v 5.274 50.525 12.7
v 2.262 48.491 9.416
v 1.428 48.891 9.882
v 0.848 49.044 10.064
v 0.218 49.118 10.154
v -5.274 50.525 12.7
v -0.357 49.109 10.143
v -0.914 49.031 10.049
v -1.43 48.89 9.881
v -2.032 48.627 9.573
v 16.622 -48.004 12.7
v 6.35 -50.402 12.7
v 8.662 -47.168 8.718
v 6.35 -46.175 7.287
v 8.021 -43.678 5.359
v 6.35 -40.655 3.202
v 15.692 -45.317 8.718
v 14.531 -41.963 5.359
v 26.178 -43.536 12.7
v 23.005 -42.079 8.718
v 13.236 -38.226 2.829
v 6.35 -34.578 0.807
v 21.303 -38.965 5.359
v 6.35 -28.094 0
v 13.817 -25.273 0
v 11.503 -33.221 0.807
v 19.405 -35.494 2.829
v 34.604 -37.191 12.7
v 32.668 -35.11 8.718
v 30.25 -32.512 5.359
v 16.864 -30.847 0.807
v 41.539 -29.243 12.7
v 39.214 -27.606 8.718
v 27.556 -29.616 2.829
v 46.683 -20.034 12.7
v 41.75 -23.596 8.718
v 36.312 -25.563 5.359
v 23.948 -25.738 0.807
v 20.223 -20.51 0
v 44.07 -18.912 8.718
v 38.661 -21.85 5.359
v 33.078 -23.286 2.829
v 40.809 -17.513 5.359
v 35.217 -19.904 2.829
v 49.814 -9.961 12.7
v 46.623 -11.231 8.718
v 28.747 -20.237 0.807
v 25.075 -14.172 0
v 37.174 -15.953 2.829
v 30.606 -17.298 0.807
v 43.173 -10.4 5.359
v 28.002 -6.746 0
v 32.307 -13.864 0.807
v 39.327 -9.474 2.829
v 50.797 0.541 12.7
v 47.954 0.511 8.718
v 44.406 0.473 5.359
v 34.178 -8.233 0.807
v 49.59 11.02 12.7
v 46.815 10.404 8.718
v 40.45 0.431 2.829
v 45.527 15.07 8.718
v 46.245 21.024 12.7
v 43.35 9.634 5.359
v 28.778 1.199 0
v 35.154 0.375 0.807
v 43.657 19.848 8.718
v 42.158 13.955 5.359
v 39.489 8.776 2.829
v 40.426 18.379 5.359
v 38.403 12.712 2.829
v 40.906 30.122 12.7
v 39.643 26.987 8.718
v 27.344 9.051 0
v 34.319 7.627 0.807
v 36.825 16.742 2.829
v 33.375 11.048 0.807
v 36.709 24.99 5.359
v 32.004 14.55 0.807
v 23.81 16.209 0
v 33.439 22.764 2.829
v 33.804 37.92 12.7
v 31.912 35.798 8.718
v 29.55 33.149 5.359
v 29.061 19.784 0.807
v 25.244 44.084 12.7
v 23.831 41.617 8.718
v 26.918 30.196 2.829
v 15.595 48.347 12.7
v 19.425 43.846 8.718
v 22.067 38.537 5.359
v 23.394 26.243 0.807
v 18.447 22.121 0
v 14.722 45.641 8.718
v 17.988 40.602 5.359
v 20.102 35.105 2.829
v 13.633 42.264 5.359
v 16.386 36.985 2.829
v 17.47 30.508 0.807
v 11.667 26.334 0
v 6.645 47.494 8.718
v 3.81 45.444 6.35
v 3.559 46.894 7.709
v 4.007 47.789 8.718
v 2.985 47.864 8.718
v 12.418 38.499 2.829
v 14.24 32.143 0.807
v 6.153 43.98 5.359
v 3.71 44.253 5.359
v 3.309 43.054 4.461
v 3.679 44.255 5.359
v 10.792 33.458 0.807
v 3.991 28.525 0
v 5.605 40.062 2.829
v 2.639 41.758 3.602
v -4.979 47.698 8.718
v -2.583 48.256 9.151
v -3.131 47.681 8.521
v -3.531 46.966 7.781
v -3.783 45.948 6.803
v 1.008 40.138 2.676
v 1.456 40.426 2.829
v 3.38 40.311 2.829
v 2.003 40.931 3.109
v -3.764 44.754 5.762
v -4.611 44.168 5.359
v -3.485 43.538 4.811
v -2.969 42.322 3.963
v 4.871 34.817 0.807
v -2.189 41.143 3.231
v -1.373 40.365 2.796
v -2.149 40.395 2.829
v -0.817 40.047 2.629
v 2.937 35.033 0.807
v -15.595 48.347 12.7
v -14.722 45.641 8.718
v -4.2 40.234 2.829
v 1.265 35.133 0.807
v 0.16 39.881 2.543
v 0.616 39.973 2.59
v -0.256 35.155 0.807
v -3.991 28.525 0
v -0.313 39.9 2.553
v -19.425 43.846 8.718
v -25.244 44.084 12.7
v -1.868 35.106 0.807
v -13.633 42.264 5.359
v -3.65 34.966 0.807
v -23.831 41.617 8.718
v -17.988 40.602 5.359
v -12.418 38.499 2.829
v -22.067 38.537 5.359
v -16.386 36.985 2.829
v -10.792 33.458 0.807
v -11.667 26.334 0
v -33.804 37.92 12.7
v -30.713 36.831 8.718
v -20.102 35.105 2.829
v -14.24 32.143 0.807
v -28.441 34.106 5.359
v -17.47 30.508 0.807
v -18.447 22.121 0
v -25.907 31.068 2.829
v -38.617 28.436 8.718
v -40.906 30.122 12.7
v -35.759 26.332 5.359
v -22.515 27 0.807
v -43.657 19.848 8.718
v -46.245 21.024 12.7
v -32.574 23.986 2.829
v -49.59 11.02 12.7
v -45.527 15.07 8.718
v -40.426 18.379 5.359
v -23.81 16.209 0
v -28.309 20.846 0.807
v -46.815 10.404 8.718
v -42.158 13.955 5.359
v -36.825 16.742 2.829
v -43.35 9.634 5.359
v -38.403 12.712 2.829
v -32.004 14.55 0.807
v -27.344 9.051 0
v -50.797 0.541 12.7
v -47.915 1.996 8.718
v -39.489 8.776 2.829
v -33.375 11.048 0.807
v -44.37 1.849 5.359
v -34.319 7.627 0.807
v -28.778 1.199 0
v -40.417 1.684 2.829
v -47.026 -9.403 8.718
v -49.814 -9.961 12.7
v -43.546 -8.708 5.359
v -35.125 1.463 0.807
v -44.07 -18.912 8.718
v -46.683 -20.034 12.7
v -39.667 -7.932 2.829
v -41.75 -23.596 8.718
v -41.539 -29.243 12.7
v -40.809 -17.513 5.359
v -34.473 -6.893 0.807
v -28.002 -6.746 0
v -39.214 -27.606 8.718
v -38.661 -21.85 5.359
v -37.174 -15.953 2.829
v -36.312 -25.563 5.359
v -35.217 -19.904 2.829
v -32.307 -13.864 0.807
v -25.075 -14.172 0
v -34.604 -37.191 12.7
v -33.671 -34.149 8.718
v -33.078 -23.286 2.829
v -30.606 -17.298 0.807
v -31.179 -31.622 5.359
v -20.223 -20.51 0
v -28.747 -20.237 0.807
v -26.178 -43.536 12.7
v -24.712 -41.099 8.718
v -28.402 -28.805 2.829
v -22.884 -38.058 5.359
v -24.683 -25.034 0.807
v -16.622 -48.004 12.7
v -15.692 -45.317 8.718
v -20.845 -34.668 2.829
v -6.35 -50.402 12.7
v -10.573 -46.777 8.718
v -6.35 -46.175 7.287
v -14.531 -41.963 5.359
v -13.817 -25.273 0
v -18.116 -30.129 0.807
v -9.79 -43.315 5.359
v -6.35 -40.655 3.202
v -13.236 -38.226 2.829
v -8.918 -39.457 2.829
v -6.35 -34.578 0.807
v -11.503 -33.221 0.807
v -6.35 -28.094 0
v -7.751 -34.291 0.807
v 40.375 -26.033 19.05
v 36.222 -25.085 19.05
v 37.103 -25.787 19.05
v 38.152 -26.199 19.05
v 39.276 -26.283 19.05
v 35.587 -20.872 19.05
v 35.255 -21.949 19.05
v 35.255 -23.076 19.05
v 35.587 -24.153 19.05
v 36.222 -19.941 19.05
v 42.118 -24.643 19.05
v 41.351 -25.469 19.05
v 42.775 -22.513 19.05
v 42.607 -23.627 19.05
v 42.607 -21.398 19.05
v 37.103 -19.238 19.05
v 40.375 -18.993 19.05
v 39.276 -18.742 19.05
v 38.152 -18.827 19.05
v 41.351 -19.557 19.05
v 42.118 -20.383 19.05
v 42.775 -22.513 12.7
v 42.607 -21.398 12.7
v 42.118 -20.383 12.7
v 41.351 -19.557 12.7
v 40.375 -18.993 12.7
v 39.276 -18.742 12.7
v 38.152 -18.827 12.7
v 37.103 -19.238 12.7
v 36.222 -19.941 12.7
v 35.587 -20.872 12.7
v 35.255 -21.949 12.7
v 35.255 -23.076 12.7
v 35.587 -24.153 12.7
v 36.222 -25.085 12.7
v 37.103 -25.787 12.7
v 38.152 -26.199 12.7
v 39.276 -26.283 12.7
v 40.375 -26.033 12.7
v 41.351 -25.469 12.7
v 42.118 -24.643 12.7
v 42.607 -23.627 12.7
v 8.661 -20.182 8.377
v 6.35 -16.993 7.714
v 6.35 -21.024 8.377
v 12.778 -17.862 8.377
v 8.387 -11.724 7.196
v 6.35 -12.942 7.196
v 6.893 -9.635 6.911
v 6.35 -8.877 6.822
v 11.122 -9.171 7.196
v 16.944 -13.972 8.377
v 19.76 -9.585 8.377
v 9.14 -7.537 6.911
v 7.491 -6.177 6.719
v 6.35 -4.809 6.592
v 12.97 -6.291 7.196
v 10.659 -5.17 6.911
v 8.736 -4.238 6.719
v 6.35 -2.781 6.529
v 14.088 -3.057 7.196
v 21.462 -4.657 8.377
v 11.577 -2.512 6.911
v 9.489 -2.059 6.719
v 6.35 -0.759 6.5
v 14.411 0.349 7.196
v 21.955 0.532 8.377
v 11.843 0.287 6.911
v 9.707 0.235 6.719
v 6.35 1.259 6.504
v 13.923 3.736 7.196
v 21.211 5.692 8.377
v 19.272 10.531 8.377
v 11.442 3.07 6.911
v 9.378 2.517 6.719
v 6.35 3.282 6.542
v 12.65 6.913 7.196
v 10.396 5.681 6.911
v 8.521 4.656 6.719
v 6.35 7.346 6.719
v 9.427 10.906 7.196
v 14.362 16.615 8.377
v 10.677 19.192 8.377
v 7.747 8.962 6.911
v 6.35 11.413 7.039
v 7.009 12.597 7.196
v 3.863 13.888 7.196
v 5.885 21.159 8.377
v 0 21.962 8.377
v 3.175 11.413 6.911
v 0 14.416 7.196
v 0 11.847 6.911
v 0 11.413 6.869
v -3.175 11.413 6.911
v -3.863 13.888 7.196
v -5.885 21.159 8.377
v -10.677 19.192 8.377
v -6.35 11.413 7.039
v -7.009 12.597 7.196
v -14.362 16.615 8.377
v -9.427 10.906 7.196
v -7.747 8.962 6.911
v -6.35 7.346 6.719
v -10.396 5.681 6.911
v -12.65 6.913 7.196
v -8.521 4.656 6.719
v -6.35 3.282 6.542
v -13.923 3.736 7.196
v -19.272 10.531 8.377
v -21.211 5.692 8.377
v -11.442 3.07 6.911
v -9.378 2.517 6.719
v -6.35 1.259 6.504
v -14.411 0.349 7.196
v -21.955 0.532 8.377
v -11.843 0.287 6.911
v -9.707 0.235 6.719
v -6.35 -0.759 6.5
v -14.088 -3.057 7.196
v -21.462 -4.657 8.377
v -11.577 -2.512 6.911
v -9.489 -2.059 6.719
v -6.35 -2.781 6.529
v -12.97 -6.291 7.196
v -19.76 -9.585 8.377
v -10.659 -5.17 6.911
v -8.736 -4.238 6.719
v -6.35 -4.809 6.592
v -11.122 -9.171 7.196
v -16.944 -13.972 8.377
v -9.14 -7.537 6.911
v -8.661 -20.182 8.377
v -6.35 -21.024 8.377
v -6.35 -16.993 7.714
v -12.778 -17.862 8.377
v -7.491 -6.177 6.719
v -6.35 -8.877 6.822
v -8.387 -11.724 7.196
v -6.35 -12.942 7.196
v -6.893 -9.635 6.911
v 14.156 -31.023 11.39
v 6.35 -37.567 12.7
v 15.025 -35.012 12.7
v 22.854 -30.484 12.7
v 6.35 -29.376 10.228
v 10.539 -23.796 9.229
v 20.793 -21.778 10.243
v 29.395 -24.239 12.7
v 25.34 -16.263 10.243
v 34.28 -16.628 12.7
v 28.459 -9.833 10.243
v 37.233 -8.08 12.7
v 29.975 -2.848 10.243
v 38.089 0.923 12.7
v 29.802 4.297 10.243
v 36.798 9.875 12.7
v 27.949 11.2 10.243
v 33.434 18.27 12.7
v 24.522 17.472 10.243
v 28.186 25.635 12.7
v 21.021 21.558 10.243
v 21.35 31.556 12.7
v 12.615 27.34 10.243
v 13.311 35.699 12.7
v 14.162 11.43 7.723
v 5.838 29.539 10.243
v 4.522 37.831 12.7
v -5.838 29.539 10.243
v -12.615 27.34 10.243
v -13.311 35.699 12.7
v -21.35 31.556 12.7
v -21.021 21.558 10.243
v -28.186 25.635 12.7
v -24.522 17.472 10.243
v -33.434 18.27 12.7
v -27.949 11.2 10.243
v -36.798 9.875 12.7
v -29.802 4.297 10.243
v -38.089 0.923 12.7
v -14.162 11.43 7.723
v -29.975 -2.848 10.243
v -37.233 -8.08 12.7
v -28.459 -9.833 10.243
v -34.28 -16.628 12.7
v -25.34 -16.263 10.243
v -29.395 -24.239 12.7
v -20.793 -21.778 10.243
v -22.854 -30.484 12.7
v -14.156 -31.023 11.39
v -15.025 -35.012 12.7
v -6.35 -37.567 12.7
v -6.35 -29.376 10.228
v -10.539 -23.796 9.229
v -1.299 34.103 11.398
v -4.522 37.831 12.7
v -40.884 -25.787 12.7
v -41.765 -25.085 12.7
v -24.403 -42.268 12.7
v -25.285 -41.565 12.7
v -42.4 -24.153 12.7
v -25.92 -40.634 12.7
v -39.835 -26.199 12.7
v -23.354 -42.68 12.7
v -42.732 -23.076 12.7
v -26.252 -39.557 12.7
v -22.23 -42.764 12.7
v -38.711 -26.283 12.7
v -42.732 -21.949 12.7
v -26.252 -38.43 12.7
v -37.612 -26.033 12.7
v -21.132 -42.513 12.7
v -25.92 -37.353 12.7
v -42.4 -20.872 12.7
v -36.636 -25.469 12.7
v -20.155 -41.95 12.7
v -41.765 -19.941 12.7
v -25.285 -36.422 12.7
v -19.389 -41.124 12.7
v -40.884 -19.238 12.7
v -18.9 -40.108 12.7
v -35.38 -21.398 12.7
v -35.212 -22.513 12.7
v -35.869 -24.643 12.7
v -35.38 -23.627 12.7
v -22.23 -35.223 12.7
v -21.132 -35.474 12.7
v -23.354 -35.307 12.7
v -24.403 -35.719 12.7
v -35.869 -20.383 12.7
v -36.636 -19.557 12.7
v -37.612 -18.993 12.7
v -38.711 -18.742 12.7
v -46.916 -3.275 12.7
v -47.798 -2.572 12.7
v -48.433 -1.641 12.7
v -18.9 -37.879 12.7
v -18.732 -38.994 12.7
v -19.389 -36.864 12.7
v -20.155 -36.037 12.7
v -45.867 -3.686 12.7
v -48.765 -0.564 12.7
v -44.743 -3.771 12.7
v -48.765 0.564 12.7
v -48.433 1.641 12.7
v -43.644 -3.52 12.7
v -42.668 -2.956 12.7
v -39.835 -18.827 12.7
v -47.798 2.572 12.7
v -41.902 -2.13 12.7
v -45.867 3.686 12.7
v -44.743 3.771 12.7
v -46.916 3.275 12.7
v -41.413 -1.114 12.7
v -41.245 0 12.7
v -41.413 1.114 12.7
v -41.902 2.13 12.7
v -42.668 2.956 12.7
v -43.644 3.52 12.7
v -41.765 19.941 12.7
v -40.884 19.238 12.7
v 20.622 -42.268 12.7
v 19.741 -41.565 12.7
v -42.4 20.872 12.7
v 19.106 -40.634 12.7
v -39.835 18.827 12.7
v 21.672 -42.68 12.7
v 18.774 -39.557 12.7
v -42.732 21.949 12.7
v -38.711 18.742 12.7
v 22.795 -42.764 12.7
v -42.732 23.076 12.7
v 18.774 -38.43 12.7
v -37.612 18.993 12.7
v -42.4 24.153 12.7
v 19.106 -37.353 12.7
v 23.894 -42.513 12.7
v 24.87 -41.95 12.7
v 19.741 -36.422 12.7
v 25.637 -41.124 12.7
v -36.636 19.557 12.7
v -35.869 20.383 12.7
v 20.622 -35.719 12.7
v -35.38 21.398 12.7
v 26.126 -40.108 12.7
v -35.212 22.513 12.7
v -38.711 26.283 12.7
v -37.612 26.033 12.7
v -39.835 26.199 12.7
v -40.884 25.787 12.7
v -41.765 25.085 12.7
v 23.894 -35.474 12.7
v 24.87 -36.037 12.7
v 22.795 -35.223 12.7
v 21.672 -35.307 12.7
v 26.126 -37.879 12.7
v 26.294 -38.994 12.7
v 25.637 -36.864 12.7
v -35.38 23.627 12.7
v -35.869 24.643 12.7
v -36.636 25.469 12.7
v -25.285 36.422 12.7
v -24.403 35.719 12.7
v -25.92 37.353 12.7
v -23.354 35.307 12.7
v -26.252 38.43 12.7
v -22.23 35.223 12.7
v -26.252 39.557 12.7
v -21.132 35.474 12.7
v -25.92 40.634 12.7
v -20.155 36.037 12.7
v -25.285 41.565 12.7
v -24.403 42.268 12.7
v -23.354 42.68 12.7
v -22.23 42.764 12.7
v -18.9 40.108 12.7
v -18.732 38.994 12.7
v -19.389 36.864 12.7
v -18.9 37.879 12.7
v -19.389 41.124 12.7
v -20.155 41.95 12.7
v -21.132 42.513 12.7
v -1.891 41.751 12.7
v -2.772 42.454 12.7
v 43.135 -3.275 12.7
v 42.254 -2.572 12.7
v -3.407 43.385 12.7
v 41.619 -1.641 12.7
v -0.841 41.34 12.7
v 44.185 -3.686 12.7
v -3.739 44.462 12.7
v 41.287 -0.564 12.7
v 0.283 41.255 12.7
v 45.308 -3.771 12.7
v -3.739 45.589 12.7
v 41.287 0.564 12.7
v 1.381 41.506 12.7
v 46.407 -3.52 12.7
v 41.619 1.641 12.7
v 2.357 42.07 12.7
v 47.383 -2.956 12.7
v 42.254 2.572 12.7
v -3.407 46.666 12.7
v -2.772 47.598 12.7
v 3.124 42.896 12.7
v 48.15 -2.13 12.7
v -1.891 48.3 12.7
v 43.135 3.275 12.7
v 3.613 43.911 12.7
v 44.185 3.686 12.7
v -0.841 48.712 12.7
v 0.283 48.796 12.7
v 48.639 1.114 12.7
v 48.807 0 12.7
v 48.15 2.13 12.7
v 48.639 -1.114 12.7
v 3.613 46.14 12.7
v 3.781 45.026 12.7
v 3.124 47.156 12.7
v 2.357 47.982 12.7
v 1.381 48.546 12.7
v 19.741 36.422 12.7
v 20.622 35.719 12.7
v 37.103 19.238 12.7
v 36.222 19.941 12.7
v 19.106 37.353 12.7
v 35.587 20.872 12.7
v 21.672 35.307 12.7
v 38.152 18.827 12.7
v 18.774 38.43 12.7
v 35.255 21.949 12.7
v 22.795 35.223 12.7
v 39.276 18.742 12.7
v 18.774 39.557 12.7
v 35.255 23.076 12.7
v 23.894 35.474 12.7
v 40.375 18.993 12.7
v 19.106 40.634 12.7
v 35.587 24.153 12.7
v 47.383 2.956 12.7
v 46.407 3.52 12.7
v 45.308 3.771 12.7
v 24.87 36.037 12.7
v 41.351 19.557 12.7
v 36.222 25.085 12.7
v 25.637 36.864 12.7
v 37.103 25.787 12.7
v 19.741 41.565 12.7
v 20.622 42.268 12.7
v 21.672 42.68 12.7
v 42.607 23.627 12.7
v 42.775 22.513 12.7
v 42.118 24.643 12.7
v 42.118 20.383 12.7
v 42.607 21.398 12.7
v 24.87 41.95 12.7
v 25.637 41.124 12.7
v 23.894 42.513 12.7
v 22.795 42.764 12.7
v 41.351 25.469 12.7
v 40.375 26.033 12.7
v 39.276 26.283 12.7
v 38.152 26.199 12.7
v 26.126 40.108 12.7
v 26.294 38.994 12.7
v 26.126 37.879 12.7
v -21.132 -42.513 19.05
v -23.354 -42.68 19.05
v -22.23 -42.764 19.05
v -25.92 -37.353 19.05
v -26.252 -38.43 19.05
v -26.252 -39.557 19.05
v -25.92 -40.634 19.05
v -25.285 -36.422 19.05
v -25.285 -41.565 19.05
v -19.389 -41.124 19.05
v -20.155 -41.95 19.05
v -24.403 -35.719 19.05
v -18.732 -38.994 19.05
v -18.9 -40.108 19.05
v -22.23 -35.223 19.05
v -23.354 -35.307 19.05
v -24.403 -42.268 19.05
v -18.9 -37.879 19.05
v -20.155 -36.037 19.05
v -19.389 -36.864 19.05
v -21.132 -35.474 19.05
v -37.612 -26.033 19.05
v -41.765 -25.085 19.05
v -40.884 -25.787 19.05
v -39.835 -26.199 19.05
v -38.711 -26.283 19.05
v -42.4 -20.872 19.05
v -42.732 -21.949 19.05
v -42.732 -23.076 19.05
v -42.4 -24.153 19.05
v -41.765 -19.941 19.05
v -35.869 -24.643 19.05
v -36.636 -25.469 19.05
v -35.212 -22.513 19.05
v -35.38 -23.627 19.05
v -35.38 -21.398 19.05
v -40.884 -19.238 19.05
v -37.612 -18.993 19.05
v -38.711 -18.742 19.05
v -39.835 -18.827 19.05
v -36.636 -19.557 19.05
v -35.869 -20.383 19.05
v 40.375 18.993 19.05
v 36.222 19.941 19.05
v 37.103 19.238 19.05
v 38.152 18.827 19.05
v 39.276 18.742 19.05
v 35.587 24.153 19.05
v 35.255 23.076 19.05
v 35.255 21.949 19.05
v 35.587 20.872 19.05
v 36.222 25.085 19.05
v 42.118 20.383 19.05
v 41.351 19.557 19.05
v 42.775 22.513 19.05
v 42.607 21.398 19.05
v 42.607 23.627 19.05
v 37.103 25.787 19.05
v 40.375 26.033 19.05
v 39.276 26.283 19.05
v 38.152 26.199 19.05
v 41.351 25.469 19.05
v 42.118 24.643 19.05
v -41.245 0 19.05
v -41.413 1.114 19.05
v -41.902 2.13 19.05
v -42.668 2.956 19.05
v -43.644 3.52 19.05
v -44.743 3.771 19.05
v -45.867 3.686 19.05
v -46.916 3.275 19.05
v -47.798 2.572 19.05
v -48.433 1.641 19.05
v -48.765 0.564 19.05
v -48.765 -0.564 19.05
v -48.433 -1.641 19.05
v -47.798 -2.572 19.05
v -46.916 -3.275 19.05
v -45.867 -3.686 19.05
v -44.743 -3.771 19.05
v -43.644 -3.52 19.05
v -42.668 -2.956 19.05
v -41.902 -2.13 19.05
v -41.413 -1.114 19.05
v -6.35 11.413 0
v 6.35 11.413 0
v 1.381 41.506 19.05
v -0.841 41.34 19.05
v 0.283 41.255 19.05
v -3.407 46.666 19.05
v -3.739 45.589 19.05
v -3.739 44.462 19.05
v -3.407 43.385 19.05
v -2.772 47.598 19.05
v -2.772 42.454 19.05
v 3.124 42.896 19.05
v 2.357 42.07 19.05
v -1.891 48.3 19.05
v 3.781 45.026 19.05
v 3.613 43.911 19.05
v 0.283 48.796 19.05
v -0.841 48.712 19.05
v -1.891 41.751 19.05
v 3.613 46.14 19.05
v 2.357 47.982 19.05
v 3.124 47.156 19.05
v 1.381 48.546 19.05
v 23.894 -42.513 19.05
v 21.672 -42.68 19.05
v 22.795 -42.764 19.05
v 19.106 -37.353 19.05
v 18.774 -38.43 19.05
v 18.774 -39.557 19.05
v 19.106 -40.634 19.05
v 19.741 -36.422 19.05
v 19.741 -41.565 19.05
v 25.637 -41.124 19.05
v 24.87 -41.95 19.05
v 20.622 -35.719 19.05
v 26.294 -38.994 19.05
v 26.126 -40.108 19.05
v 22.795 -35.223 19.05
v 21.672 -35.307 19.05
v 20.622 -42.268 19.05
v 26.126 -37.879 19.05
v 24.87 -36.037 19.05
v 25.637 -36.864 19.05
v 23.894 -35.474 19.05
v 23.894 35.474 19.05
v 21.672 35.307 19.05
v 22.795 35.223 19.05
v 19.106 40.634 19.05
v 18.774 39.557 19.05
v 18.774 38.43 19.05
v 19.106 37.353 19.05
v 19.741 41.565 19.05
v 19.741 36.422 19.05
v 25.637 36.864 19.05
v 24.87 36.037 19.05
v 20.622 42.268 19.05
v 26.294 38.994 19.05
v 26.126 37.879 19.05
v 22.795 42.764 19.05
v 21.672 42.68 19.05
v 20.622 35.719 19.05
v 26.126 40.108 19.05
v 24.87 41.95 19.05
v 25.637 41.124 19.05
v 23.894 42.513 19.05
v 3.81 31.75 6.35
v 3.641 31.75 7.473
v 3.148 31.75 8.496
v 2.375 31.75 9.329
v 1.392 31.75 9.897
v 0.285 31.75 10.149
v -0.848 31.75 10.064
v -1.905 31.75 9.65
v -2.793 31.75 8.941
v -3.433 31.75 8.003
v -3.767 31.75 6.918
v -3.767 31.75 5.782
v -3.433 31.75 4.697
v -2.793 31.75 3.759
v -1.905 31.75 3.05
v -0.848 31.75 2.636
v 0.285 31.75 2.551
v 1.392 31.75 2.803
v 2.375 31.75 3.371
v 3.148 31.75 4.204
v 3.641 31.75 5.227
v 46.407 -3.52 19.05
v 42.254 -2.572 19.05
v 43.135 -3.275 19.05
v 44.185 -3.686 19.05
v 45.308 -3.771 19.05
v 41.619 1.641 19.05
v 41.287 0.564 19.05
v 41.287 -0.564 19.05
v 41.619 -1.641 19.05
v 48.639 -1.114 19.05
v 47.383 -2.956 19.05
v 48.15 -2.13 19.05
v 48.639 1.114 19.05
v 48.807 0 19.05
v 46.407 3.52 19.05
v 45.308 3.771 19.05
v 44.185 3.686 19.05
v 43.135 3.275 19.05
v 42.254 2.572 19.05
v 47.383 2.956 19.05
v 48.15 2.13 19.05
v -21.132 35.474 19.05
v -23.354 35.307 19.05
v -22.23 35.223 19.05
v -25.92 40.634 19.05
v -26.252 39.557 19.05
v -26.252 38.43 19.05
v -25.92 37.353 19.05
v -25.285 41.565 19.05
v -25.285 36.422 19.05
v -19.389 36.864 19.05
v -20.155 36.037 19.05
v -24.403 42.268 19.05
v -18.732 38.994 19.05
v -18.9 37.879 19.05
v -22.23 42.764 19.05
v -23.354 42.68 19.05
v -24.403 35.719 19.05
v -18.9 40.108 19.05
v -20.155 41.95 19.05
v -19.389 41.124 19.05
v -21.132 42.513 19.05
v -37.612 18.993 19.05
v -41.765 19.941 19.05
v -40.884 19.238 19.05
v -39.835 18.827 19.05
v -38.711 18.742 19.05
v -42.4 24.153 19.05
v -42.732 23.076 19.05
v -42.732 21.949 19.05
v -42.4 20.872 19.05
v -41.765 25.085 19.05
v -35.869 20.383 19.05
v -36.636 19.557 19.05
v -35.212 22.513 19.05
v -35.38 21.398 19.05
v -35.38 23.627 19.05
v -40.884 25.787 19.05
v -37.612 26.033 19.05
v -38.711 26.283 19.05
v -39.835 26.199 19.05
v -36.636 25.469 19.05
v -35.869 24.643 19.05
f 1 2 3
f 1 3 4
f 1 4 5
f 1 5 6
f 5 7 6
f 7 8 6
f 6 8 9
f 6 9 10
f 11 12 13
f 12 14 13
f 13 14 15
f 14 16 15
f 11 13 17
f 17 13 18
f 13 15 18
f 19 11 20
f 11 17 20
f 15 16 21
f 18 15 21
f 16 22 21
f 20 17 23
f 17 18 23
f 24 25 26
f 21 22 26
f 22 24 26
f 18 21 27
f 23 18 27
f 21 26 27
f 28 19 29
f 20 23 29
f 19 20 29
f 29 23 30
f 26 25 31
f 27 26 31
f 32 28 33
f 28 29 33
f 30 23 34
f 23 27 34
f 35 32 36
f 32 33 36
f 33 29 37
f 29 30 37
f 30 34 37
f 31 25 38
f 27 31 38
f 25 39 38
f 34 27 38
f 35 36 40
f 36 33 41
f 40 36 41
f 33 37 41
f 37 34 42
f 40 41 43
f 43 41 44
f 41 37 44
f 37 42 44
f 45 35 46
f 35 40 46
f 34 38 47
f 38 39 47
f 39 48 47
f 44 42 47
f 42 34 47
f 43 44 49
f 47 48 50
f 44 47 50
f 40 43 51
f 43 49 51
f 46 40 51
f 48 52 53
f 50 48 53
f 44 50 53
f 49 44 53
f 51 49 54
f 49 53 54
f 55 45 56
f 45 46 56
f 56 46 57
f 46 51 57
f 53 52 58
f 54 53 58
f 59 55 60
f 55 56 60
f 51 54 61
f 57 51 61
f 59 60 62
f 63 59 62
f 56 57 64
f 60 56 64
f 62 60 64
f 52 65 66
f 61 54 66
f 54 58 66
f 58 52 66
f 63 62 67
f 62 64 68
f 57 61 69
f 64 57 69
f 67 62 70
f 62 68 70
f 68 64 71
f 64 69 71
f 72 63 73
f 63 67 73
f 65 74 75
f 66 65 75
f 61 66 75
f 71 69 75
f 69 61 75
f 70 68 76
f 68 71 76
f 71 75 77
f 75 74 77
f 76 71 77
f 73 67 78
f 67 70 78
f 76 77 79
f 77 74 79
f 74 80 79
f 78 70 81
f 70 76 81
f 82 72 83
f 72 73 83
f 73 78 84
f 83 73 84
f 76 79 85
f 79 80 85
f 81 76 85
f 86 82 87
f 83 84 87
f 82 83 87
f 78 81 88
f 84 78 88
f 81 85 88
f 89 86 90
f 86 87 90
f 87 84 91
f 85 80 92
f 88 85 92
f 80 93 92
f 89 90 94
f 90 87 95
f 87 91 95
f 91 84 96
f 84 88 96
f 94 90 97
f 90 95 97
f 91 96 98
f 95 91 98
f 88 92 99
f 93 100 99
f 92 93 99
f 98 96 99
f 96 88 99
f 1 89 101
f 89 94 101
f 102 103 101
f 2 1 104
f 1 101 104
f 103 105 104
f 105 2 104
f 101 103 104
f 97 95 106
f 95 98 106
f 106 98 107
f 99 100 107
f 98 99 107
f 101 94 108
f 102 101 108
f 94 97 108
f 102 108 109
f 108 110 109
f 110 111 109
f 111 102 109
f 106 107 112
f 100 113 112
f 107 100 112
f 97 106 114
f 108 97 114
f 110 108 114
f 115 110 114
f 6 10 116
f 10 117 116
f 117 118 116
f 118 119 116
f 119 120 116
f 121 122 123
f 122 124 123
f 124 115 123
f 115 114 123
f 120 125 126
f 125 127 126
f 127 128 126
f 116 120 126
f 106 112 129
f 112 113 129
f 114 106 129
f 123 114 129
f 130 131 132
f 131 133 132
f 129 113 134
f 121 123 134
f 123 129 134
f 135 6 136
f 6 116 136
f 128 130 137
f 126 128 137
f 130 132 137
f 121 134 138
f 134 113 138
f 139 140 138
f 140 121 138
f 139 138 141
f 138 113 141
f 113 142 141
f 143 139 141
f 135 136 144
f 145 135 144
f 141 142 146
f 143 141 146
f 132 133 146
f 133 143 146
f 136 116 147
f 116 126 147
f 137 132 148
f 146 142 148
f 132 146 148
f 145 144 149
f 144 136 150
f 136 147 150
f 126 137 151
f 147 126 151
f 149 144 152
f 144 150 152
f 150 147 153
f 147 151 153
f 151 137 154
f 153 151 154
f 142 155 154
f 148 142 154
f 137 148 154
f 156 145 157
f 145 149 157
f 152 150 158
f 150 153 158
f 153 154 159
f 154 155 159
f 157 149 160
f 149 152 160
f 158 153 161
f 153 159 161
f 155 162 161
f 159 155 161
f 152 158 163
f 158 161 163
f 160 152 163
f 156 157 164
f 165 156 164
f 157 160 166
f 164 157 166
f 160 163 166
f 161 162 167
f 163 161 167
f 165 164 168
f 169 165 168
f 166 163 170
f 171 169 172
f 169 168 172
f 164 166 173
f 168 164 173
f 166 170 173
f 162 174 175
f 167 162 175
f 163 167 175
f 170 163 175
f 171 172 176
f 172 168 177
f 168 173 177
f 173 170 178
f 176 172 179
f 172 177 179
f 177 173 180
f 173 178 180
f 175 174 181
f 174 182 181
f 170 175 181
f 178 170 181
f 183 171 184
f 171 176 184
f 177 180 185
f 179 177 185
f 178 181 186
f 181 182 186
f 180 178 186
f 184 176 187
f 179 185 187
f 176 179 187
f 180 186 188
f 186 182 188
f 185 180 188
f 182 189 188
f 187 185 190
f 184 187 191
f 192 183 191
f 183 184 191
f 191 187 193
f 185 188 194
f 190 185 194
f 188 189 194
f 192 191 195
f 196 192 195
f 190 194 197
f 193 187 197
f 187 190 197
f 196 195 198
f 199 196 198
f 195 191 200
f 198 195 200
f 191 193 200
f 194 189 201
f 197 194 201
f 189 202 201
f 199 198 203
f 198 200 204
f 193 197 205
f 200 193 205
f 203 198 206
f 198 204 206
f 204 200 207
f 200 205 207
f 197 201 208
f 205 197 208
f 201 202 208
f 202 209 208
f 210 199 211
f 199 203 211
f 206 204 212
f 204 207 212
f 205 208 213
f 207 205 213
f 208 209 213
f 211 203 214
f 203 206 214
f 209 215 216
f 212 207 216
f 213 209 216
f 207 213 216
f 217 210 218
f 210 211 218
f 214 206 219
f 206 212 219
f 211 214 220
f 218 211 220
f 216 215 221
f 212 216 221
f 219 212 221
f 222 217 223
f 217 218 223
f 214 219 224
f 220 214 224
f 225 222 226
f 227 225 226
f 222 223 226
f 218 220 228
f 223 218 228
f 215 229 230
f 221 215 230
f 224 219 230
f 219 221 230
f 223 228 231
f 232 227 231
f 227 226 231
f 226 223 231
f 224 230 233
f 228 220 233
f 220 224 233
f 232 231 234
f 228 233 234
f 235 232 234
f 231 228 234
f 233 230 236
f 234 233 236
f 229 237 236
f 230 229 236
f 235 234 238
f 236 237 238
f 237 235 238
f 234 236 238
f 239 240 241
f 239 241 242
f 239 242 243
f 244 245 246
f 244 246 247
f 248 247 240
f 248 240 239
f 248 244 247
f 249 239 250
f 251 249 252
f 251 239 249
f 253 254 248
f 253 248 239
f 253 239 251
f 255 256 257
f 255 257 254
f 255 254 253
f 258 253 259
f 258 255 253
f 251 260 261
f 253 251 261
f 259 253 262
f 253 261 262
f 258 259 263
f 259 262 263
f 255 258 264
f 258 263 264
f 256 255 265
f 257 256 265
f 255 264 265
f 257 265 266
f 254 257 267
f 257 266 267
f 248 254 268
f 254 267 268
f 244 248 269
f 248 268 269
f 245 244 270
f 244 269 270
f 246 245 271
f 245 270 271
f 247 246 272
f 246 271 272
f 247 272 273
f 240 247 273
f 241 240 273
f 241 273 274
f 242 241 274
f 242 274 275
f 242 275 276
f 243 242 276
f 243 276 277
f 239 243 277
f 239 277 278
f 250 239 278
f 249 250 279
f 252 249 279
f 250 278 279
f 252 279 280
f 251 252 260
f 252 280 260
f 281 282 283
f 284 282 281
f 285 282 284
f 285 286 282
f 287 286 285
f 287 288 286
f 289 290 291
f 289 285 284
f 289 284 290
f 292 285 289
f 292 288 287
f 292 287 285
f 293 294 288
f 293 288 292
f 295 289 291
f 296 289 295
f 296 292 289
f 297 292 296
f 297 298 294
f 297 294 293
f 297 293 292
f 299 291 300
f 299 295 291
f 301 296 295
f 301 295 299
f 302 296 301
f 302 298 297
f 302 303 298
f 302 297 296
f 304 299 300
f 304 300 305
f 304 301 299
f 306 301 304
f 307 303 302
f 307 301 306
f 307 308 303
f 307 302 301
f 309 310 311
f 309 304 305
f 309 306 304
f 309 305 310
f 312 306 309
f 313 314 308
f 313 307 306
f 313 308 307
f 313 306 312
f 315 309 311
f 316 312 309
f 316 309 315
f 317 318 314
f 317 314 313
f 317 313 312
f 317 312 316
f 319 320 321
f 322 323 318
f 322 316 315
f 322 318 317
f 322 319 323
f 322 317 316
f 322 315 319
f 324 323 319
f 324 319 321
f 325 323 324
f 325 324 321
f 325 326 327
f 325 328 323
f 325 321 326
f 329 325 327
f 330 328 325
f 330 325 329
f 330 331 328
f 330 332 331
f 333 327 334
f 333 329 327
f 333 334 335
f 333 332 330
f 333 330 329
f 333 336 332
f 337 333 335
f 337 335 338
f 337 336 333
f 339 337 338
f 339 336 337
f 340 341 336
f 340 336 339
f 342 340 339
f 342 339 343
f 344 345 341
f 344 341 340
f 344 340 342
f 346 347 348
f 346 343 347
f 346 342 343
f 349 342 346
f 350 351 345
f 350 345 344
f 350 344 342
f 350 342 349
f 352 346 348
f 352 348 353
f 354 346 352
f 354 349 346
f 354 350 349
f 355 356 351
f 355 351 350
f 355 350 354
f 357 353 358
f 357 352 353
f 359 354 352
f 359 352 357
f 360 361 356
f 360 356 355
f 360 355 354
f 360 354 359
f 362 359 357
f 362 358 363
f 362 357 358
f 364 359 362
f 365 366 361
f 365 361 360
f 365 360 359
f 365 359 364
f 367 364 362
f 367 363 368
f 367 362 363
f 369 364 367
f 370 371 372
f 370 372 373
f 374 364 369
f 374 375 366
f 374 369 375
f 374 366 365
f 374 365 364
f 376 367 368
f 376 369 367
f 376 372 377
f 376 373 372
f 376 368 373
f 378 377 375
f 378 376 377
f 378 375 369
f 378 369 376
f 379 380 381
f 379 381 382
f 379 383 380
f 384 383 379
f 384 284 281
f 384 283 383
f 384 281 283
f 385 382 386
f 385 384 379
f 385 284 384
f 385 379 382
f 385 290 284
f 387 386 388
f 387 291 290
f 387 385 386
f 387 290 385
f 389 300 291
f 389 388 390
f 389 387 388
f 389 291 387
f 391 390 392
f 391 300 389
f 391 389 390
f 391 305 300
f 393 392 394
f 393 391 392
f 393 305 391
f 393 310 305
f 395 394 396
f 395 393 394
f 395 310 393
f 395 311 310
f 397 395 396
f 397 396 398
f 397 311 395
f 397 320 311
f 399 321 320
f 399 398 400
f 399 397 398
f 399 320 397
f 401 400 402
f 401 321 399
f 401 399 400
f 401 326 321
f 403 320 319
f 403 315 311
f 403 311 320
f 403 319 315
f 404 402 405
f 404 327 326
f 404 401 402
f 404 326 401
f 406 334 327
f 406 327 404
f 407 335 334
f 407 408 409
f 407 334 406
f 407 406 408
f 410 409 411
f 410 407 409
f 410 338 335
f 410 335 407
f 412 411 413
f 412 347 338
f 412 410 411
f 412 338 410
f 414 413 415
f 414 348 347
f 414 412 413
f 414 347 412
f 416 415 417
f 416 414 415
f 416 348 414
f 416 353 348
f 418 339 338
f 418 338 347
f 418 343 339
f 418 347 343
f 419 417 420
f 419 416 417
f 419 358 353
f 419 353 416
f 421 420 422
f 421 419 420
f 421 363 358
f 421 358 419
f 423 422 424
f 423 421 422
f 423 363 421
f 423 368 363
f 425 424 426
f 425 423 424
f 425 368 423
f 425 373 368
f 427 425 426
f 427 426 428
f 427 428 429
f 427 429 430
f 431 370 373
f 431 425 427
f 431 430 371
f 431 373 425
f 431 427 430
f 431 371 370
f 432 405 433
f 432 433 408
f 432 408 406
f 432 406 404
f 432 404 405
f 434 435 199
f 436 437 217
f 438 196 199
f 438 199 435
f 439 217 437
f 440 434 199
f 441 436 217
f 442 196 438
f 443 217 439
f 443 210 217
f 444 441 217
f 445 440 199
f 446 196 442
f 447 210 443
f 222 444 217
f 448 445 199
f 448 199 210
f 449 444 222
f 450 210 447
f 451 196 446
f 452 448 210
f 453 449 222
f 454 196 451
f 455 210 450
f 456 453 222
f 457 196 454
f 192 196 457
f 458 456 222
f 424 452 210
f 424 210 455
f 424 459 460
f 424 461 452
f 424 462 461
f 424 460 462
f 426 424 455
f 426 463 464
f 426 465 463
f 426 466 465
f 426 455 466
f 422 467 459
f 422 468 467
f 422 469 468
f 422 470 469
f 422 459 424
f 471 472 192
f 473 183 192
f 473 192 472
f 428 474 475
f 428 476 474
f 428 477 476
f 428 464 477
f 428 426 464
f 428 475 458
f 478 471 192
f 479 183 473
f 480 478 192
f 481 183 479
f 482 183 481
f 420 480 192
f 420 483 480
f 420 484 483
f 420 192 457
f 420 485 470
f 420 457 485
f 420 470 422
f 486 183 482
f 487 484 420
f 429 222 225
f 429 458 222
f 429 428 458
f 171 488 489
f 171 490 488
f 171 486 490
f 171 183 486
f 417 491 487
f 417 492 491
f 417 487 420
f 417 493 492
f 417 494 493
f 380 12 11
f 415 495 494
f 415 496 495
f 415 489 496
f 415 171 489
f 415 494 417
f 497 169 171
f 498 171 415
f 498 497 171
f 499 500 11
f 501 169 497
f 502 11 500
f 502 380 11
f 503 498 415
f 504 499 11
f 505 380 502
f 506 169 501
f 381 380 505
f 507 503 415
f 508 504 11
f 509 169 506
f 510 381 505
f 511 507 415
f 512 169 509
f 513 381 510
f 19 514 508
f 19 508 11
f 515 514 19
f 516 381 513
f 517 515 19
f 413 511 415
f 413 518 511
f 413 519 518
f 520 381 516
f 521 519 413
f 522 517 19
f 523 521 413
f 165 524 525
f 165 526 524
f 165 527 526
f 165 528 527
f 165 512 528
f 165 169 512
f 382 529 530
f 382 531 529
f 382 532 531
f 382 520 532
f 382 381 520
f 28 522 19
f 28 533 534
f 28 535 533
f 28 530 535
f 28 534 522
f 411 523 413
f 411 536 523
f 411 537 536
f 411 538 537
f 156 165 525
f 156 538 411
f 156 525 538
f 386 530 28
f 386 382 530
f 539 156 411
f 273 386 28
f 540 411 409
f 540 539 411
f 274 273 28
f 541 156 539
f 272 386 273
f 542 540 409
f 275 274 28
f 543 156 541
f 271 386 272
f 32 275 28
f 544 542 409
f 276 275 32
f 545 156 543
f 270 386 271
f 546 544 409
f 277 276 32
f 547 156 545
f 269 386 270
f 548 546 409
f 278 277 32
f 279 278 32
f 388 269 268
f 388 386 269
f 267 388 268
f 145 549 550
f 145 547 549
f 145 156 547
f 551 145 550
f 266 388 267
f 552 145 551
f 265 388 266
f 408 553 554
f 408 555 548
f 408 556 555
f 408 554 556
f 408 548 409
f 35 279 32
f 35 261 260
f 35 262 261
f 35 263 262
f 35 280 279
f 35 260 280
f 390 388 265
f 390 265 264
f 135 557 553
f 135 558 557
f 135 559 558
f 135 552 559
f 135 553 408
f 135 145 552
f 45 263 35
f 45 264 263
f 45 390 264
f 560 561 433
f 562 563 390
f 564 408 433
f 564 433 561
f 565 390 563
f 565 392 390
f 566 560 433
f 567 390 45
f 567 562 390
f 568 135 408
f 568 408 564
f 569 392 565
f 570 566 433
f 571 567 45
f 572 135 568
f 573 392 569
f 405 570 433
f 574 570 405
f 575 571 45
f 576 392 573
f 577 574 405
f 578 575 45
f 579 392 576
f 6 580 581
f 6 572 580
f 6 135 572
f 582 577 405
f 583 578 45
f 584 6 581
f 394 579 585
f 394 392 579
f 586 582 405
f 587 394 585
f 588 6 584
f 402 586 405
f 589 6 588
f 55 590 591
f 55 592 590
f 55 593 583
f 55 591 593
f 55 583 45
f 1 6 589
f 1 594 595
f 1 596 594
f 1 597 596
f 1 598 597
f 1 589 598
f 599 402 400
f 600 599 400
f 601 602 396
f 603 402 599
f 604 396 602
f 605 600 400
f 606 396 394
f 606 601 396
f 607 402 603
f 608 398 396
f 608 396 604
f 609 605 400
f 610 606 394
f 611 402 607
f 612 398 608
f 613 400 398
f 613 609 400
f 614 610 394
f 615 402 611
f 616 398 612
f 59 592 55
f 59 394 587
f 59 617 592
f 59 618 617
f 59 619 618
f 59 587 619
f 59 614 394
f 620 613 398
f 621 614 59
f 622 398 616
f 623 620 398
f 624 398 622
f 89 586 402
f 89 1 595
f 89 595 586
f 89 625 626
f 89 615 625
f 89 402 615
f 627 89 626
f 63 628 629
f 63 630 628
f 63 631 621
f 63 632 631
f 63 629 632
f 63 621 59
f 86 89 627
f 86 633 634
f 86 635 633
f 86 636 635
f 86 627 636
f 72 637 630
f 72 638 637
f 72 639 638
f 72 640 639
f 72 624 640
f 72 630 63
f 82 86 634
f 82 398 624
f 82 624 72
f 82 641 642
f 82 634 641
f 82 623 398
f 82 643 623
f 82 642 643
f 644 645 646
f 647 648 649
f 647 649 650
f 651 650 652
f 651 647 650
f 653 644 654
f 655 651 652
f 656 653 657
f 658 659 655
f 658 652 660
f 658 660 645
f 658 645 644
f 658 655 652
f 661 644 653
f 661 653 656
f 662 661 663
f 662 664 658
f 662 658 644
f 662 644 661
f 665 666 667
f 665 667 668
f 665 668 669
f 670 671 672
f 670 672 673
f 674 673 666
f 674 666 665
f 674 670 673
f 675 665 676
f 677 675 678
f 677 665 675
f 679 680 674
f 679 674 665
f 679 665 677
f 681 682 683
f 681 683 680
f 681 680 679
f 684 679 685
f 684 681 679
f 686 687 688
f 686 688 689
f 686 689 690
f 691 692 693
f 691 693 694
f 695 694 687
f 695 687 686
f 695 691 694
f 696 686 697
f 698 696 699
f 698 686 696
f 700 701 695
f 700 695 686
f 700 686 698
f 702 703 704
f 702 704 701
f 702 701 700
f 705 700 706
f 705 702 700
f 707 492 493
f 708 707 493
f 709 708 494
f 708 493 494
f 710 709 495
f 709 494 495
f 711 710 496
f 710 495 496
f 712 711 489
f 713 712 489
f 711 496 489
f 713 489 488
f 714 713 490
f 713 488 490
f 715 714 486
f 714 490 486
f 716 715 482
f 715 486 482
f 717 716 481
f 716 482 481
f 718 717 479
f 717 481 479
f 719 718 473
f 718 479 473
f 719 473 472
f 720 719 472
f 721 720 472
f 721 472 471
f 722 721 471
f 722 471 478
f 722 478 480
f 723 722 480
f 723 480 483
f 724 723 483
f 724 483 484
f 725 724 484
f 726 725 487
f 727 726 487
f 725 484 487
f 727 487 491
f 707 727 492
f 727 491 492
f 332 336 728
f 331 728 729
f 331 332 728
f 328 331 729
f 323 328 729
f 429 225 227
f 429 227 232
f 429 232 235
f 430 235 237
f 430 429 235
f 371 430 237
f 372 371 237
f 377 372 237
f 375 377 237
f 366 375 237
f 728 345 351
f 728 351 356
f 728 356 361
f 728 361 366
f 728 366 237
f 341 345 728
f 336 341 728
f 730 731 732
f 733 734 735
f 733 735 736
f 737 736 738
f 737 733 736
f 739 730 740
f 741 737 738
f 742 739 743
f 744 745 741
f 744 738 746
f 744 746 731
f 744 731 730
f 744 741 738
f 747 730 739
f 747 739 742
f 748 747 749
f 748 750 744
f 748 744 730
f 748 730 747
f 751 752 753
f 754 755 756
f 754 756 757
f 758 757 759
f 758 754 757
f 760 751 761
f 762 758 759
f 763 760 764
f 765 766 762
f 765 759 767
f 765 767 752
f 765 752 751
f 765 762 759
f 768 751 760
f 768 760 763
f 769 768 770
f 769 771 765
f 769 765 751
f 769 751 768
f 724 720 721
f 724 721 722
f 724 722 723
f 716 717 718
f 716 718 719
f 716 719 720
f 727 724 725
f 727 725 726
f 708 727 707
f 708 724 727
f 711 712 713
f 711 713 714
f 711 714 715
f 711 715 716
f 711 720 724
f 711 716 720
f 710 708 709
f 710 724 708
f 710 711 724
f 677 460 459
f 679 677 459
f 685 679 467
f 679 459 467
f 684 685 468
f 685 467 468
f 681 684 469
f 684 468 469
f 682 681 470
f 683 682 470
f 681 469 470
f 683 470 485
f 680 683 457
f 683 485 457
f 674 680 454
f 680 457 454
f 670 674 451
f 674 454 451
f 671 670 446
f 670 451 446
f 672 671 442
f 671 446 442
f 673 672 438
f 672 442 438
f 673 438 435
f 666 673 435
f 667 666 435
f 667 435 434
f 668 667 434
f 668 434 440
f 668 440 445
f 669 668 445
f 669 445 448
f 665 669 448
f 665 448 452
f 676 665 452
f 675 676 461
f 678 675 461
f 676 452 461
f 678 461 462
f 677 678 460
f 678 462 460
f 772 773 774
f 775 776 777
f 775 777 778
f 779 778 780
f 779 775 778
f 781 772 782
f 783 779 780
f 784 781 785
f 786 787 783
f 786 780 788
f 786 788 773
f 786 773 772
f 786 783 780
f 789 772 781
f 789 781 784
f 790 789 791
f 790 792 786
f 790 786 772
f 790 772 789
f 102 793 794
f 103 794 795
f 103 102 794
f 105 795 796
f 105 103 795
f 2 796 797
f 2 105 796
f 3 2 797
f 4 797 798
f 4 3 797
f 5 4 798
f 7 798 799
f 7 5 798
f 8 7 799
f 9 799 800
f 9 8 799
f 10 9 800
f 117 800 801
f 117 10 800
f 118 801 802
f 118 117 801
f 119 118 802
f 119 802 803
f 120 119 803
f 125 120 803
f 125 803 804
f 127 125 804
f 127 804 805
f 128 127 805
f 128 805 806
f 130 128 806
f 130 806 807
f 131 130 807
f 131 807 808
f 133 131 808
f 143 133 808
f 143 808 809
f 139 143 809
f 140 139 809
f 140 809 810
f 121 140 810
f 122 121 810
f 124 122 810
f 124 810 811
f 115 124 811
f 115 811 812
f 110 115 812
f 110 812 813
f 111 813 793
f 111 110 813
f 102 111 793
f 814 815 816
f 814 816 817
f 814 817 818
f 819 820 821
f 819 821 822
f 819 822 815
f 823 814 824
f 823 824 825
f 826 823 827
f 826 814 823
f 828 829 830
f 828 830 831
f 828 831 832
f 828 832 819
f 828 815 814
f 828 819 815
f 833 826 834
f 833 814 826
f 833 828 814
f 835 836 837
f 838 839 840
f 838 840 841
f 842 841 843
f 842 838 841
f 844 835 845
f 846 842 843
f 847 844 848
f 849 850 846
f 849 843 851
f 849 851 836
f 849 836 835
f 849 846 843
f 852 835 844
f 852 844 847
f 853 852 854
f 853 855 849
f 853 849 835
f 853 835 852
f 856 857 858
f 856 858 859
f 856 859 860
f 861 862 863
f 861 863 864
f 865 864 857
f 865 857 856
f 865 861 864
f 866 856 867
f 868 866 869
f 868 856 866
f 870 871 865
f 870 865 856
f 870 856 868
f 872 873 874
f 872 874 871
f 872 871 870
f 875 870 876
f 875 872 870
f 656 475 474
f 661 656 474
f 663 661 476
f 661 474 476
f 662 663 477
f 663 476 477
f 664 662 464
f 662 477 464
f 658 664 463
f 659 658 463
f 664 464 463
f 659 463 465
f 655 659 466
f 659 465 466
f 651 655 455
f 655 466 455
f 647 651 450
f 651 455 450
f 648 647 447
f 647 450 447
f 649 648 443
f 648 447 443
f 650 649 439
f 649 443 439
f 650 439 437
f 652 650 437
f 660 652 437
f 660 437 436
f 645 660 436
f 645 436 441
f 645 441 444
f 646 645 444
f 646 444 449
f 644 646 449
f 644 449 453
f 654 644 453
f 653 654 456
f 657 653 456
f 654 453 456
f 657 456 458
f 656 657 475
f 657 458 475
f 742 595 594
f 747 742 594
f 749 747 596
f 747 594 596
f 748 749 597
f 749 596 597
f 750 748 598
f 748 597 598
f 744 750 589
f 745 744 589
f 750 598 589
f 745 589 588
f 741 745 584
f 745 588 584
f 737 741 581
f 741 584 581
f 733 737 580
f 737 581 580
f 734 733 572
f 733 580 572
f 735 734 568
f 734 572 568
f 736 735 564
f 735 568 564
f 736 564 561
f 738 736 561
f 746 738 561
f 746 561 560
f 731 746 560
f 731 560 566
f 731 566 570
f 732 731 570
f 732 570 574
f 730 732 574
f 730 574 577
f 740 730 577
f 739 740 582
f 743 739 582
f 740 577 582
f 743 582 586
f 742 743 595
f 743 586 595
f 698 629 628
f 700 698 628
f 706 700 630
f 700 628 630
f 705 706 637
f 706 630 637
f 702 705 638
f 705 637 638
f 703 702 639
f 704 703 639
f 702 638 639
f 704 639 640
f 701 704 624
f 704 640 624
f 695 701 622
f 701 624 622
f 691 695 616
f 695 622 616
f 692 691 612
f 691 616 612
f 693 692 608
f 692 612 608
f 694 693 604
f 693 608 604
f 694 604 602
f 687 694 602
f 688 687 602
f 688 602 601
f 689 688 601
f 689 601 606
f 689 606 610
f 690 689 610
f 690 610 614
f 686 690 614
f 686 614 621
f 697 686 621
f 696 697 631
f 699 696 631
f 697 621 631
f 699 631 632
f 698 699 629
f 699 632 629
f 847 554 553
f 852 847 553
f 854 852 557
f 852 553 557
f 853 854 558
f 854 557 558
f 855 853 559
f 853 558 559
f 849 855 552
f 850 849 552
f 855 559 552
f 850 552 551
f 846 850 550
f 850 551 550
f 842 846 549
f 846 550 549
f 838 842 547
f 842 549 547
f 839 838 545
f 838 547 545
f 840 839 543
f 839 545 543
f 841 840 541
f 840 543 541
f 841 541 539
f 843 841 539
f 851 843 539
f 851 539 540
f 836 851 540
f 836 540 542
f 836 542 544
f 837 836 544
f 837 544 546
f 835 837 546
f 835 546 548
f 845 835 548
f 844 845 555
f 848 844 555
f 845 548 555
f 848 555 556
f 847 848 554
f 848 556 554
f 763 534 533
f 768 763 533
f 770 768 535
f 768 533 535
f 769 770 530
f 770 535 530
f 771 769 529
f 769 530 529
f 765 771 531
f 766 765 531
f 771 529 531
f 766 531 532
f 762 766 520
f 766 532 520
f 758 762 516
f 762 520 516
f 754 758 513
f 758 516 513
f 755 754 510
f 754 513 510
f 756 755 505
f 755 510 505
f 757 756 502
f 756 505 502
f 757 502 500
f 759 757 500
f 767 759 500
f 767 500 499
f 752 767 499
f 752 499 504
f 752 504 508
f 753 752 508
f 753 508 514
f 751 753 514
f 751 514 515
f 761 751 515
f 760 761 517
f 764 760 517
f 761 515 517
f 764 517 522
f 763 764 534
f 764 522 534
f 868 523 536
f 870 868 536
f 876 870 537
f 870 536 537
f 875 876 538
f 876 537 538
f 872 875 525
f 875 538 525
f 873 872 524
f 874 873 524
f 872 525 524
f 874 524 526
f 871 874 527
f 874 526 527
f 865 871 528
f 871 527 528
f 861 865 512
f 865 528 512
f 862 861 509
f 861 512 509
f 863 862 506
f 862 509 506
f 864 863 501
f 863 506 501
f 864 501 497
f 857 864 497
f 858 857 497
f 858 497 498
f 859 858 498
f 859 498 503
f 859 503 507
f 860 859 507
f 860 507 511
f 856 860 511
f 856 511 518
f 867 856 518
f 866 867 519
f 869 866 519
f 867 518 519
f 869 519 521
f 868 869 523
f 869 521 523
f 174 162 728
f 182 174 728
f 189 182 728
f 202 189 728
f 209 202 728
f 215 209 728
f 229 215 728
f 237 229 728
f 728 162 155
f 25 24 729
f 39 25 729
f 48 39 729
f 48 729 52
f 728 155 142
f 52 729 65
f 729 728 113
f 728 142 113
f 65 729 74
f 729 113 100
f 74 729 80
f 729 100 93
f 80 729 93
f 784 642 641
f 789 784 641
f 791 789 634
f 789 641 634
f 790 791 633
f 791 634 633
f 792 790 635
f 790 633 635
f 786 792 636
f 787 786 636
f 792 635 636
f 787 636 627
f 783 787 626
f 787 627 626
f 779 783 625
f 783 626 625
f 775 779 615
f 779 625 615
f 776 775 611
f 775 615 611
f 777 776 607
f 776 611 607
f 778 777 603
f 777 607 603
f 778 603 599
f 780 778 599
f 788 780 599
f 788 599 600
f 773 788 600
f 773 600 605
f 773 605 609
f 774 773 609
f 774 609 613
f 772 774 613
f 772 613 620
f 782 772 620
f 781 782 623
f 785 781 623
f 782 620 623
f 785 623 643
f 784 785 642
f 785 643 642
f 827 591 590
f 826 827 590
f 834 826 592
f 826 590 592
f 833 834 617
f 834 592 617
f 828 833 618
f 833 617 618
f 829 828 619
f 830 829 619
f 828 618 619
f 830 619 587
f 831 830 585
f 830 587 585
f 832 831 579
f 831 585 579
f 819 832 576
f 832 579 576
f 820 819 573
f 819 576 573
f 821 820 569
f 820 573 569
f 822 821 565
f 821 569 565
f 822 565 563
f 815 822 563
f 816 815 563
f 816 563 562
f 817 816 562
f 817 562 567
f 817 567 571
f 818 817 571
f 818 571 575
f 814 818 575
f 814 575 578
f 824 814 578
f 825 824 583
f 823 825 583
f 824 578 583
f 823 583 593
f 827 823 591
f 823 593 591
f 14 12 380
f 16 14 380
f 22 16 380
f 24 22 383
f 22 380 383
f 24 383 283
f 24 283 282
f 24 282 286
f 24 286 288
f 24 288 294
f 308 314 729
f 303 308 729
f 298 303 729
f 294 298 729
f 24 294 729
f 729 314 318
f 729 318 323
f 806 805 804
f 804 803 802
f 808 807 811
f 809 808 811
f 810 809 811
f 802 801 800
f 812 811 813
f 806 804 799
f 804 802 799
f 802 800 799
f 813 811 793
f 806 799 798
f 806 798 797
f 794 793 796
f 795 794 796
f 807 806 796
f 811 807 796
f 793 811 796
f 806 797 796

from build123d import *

# Parameters (mm, degrees)
F0_R      = 50.8
F1_DEPTH  = 12.7
F3_R      = 38.1
F4_DEPTH  = 6.35
F6_W      = 12.7
F6_H      = 83.8771756418
F7_DEPTH  = 25.4
F9_R      = 3.81
F10_DEPTH = 41.656
F11_R     = 3.7810776449
F12_DEPTH = 6.35


# Not quite as in the source:
# - a fillet or chamfer that OpenCascade refuses, or shapes differently, is made with other operations: its cross-section is extruded or revolved along the edge and cut away or added


with BuildPart() as f1:
    # F0 (on Top) → F1 (new body)
    with BuildSketch(Plane.XY):
        Circle(F0_R)
    extrude(amount=F1_DEPTH)

    # F2: fillet of radius 25.4 on 1 edges, made by hand

    # F2_s1 → F2_t2 (revolve, cut)
    with BuildSketch(Plane.XZ):
        with BuildLine():
            ThreePointArc((50.8, 12.7), (41.5029547439, 3.4029547439), (28.8029547439, 0))
            Line((28.8029547439, 0), (28.8029547439, -0.508))
            Line((28.8029547439, -0.508), (50.8, -0.508))
            Line((50.8, -0.508), (51.308, 0))
            ThreePointArc((51.308, 0), (51.308, 6.35), (51.2399409051, 12.446))
            Line((51.2399409051, 12.446), (50.8, 12.7))
        make_face()
    revolve(axis=Axis((0, 0, 0), (0, 0, 1)), mode=Mode.SUBTRACT)

    # F3 (on face) → F4 (cut)
    with BuildSketch(Plane.XY.offset(12.7)):
        Circle(F3_R)
    extrude(amount=-F4_DEPTH, mode=Mode.SUBTRACT)

    # F5: fillet of radius 114.3 on 1 edges, made by hand

    # F5_s1 → F5_t2 (revolve)
    with BuildSketch(Plane.XZ):
        with BuildLine():
            ThreePointArc((38.1, 12.7), (19.5828933773, 7.948680132), (0.5328933773, 6.35))
            Line((0.5328933773, 6.35), (38.1, 6.35))
            Line((38.1, 6.35), (38.1, 12.7))
        make_face()
    revolve(axis=Axis((0, 0, 6.35), (0, 0, 1)))

    # F6 (on face) → F7 (cut)
    with BuildSketch(Plane.XY.offset(12.7)):
        with Locations((0, -30.5251618847)):
            Rectangle(F6_W, F6_H)
    extrude(amount=-F7_DEPTH, mode=Mode.SUBTRACT)

    # F9 (on offset) → F10 (cut)
    with BuildSketch(Plane.XZ.offset(-73.406)):
        with Locations((0, 6.35)):
            Circle(F9_R)
    extrude(amount=F10_DEPTH, mode=Mode.SUBTRACT)

    # F11 (on face) → F12 (join)
    with BuildSketch(Plane.XY.offset(12.7)):
        with Locations((-45.025870204, 0)):
            Circle(F11_R)
        with Locations((-38.9935474241, -22.512935102)):
            Circle(F11_R)
        with Locations((-22.512935102, -38.9935474241)):
            Circle(F11_R)
        with Locations((22.512935102, -38.9935474241)):
            Circle(F11_R)
        with Locations((38.9935474241, -22.512935102)):
            Circle(F11_R)
        with Locations((45.025870204, 0)):
            Circle(F11_R)
        with Locations((38.9935474241, 22.512935102)):
            Circle(F11_R)
        with Locations((22.512935102, 38.9935474241)):
            Circle(F11_R)
        with Locations((0, 45.025870204)):
            Circle(F11_R)
        with Locations((-22.512935102, 38.9935474241)):
            Circle(F11_R)
        with Locations((-38.9935474241, 22.512935102)):
            Circle(F11_R)
    extrude(amount=F12_DEPTH)


solid = f1.part
